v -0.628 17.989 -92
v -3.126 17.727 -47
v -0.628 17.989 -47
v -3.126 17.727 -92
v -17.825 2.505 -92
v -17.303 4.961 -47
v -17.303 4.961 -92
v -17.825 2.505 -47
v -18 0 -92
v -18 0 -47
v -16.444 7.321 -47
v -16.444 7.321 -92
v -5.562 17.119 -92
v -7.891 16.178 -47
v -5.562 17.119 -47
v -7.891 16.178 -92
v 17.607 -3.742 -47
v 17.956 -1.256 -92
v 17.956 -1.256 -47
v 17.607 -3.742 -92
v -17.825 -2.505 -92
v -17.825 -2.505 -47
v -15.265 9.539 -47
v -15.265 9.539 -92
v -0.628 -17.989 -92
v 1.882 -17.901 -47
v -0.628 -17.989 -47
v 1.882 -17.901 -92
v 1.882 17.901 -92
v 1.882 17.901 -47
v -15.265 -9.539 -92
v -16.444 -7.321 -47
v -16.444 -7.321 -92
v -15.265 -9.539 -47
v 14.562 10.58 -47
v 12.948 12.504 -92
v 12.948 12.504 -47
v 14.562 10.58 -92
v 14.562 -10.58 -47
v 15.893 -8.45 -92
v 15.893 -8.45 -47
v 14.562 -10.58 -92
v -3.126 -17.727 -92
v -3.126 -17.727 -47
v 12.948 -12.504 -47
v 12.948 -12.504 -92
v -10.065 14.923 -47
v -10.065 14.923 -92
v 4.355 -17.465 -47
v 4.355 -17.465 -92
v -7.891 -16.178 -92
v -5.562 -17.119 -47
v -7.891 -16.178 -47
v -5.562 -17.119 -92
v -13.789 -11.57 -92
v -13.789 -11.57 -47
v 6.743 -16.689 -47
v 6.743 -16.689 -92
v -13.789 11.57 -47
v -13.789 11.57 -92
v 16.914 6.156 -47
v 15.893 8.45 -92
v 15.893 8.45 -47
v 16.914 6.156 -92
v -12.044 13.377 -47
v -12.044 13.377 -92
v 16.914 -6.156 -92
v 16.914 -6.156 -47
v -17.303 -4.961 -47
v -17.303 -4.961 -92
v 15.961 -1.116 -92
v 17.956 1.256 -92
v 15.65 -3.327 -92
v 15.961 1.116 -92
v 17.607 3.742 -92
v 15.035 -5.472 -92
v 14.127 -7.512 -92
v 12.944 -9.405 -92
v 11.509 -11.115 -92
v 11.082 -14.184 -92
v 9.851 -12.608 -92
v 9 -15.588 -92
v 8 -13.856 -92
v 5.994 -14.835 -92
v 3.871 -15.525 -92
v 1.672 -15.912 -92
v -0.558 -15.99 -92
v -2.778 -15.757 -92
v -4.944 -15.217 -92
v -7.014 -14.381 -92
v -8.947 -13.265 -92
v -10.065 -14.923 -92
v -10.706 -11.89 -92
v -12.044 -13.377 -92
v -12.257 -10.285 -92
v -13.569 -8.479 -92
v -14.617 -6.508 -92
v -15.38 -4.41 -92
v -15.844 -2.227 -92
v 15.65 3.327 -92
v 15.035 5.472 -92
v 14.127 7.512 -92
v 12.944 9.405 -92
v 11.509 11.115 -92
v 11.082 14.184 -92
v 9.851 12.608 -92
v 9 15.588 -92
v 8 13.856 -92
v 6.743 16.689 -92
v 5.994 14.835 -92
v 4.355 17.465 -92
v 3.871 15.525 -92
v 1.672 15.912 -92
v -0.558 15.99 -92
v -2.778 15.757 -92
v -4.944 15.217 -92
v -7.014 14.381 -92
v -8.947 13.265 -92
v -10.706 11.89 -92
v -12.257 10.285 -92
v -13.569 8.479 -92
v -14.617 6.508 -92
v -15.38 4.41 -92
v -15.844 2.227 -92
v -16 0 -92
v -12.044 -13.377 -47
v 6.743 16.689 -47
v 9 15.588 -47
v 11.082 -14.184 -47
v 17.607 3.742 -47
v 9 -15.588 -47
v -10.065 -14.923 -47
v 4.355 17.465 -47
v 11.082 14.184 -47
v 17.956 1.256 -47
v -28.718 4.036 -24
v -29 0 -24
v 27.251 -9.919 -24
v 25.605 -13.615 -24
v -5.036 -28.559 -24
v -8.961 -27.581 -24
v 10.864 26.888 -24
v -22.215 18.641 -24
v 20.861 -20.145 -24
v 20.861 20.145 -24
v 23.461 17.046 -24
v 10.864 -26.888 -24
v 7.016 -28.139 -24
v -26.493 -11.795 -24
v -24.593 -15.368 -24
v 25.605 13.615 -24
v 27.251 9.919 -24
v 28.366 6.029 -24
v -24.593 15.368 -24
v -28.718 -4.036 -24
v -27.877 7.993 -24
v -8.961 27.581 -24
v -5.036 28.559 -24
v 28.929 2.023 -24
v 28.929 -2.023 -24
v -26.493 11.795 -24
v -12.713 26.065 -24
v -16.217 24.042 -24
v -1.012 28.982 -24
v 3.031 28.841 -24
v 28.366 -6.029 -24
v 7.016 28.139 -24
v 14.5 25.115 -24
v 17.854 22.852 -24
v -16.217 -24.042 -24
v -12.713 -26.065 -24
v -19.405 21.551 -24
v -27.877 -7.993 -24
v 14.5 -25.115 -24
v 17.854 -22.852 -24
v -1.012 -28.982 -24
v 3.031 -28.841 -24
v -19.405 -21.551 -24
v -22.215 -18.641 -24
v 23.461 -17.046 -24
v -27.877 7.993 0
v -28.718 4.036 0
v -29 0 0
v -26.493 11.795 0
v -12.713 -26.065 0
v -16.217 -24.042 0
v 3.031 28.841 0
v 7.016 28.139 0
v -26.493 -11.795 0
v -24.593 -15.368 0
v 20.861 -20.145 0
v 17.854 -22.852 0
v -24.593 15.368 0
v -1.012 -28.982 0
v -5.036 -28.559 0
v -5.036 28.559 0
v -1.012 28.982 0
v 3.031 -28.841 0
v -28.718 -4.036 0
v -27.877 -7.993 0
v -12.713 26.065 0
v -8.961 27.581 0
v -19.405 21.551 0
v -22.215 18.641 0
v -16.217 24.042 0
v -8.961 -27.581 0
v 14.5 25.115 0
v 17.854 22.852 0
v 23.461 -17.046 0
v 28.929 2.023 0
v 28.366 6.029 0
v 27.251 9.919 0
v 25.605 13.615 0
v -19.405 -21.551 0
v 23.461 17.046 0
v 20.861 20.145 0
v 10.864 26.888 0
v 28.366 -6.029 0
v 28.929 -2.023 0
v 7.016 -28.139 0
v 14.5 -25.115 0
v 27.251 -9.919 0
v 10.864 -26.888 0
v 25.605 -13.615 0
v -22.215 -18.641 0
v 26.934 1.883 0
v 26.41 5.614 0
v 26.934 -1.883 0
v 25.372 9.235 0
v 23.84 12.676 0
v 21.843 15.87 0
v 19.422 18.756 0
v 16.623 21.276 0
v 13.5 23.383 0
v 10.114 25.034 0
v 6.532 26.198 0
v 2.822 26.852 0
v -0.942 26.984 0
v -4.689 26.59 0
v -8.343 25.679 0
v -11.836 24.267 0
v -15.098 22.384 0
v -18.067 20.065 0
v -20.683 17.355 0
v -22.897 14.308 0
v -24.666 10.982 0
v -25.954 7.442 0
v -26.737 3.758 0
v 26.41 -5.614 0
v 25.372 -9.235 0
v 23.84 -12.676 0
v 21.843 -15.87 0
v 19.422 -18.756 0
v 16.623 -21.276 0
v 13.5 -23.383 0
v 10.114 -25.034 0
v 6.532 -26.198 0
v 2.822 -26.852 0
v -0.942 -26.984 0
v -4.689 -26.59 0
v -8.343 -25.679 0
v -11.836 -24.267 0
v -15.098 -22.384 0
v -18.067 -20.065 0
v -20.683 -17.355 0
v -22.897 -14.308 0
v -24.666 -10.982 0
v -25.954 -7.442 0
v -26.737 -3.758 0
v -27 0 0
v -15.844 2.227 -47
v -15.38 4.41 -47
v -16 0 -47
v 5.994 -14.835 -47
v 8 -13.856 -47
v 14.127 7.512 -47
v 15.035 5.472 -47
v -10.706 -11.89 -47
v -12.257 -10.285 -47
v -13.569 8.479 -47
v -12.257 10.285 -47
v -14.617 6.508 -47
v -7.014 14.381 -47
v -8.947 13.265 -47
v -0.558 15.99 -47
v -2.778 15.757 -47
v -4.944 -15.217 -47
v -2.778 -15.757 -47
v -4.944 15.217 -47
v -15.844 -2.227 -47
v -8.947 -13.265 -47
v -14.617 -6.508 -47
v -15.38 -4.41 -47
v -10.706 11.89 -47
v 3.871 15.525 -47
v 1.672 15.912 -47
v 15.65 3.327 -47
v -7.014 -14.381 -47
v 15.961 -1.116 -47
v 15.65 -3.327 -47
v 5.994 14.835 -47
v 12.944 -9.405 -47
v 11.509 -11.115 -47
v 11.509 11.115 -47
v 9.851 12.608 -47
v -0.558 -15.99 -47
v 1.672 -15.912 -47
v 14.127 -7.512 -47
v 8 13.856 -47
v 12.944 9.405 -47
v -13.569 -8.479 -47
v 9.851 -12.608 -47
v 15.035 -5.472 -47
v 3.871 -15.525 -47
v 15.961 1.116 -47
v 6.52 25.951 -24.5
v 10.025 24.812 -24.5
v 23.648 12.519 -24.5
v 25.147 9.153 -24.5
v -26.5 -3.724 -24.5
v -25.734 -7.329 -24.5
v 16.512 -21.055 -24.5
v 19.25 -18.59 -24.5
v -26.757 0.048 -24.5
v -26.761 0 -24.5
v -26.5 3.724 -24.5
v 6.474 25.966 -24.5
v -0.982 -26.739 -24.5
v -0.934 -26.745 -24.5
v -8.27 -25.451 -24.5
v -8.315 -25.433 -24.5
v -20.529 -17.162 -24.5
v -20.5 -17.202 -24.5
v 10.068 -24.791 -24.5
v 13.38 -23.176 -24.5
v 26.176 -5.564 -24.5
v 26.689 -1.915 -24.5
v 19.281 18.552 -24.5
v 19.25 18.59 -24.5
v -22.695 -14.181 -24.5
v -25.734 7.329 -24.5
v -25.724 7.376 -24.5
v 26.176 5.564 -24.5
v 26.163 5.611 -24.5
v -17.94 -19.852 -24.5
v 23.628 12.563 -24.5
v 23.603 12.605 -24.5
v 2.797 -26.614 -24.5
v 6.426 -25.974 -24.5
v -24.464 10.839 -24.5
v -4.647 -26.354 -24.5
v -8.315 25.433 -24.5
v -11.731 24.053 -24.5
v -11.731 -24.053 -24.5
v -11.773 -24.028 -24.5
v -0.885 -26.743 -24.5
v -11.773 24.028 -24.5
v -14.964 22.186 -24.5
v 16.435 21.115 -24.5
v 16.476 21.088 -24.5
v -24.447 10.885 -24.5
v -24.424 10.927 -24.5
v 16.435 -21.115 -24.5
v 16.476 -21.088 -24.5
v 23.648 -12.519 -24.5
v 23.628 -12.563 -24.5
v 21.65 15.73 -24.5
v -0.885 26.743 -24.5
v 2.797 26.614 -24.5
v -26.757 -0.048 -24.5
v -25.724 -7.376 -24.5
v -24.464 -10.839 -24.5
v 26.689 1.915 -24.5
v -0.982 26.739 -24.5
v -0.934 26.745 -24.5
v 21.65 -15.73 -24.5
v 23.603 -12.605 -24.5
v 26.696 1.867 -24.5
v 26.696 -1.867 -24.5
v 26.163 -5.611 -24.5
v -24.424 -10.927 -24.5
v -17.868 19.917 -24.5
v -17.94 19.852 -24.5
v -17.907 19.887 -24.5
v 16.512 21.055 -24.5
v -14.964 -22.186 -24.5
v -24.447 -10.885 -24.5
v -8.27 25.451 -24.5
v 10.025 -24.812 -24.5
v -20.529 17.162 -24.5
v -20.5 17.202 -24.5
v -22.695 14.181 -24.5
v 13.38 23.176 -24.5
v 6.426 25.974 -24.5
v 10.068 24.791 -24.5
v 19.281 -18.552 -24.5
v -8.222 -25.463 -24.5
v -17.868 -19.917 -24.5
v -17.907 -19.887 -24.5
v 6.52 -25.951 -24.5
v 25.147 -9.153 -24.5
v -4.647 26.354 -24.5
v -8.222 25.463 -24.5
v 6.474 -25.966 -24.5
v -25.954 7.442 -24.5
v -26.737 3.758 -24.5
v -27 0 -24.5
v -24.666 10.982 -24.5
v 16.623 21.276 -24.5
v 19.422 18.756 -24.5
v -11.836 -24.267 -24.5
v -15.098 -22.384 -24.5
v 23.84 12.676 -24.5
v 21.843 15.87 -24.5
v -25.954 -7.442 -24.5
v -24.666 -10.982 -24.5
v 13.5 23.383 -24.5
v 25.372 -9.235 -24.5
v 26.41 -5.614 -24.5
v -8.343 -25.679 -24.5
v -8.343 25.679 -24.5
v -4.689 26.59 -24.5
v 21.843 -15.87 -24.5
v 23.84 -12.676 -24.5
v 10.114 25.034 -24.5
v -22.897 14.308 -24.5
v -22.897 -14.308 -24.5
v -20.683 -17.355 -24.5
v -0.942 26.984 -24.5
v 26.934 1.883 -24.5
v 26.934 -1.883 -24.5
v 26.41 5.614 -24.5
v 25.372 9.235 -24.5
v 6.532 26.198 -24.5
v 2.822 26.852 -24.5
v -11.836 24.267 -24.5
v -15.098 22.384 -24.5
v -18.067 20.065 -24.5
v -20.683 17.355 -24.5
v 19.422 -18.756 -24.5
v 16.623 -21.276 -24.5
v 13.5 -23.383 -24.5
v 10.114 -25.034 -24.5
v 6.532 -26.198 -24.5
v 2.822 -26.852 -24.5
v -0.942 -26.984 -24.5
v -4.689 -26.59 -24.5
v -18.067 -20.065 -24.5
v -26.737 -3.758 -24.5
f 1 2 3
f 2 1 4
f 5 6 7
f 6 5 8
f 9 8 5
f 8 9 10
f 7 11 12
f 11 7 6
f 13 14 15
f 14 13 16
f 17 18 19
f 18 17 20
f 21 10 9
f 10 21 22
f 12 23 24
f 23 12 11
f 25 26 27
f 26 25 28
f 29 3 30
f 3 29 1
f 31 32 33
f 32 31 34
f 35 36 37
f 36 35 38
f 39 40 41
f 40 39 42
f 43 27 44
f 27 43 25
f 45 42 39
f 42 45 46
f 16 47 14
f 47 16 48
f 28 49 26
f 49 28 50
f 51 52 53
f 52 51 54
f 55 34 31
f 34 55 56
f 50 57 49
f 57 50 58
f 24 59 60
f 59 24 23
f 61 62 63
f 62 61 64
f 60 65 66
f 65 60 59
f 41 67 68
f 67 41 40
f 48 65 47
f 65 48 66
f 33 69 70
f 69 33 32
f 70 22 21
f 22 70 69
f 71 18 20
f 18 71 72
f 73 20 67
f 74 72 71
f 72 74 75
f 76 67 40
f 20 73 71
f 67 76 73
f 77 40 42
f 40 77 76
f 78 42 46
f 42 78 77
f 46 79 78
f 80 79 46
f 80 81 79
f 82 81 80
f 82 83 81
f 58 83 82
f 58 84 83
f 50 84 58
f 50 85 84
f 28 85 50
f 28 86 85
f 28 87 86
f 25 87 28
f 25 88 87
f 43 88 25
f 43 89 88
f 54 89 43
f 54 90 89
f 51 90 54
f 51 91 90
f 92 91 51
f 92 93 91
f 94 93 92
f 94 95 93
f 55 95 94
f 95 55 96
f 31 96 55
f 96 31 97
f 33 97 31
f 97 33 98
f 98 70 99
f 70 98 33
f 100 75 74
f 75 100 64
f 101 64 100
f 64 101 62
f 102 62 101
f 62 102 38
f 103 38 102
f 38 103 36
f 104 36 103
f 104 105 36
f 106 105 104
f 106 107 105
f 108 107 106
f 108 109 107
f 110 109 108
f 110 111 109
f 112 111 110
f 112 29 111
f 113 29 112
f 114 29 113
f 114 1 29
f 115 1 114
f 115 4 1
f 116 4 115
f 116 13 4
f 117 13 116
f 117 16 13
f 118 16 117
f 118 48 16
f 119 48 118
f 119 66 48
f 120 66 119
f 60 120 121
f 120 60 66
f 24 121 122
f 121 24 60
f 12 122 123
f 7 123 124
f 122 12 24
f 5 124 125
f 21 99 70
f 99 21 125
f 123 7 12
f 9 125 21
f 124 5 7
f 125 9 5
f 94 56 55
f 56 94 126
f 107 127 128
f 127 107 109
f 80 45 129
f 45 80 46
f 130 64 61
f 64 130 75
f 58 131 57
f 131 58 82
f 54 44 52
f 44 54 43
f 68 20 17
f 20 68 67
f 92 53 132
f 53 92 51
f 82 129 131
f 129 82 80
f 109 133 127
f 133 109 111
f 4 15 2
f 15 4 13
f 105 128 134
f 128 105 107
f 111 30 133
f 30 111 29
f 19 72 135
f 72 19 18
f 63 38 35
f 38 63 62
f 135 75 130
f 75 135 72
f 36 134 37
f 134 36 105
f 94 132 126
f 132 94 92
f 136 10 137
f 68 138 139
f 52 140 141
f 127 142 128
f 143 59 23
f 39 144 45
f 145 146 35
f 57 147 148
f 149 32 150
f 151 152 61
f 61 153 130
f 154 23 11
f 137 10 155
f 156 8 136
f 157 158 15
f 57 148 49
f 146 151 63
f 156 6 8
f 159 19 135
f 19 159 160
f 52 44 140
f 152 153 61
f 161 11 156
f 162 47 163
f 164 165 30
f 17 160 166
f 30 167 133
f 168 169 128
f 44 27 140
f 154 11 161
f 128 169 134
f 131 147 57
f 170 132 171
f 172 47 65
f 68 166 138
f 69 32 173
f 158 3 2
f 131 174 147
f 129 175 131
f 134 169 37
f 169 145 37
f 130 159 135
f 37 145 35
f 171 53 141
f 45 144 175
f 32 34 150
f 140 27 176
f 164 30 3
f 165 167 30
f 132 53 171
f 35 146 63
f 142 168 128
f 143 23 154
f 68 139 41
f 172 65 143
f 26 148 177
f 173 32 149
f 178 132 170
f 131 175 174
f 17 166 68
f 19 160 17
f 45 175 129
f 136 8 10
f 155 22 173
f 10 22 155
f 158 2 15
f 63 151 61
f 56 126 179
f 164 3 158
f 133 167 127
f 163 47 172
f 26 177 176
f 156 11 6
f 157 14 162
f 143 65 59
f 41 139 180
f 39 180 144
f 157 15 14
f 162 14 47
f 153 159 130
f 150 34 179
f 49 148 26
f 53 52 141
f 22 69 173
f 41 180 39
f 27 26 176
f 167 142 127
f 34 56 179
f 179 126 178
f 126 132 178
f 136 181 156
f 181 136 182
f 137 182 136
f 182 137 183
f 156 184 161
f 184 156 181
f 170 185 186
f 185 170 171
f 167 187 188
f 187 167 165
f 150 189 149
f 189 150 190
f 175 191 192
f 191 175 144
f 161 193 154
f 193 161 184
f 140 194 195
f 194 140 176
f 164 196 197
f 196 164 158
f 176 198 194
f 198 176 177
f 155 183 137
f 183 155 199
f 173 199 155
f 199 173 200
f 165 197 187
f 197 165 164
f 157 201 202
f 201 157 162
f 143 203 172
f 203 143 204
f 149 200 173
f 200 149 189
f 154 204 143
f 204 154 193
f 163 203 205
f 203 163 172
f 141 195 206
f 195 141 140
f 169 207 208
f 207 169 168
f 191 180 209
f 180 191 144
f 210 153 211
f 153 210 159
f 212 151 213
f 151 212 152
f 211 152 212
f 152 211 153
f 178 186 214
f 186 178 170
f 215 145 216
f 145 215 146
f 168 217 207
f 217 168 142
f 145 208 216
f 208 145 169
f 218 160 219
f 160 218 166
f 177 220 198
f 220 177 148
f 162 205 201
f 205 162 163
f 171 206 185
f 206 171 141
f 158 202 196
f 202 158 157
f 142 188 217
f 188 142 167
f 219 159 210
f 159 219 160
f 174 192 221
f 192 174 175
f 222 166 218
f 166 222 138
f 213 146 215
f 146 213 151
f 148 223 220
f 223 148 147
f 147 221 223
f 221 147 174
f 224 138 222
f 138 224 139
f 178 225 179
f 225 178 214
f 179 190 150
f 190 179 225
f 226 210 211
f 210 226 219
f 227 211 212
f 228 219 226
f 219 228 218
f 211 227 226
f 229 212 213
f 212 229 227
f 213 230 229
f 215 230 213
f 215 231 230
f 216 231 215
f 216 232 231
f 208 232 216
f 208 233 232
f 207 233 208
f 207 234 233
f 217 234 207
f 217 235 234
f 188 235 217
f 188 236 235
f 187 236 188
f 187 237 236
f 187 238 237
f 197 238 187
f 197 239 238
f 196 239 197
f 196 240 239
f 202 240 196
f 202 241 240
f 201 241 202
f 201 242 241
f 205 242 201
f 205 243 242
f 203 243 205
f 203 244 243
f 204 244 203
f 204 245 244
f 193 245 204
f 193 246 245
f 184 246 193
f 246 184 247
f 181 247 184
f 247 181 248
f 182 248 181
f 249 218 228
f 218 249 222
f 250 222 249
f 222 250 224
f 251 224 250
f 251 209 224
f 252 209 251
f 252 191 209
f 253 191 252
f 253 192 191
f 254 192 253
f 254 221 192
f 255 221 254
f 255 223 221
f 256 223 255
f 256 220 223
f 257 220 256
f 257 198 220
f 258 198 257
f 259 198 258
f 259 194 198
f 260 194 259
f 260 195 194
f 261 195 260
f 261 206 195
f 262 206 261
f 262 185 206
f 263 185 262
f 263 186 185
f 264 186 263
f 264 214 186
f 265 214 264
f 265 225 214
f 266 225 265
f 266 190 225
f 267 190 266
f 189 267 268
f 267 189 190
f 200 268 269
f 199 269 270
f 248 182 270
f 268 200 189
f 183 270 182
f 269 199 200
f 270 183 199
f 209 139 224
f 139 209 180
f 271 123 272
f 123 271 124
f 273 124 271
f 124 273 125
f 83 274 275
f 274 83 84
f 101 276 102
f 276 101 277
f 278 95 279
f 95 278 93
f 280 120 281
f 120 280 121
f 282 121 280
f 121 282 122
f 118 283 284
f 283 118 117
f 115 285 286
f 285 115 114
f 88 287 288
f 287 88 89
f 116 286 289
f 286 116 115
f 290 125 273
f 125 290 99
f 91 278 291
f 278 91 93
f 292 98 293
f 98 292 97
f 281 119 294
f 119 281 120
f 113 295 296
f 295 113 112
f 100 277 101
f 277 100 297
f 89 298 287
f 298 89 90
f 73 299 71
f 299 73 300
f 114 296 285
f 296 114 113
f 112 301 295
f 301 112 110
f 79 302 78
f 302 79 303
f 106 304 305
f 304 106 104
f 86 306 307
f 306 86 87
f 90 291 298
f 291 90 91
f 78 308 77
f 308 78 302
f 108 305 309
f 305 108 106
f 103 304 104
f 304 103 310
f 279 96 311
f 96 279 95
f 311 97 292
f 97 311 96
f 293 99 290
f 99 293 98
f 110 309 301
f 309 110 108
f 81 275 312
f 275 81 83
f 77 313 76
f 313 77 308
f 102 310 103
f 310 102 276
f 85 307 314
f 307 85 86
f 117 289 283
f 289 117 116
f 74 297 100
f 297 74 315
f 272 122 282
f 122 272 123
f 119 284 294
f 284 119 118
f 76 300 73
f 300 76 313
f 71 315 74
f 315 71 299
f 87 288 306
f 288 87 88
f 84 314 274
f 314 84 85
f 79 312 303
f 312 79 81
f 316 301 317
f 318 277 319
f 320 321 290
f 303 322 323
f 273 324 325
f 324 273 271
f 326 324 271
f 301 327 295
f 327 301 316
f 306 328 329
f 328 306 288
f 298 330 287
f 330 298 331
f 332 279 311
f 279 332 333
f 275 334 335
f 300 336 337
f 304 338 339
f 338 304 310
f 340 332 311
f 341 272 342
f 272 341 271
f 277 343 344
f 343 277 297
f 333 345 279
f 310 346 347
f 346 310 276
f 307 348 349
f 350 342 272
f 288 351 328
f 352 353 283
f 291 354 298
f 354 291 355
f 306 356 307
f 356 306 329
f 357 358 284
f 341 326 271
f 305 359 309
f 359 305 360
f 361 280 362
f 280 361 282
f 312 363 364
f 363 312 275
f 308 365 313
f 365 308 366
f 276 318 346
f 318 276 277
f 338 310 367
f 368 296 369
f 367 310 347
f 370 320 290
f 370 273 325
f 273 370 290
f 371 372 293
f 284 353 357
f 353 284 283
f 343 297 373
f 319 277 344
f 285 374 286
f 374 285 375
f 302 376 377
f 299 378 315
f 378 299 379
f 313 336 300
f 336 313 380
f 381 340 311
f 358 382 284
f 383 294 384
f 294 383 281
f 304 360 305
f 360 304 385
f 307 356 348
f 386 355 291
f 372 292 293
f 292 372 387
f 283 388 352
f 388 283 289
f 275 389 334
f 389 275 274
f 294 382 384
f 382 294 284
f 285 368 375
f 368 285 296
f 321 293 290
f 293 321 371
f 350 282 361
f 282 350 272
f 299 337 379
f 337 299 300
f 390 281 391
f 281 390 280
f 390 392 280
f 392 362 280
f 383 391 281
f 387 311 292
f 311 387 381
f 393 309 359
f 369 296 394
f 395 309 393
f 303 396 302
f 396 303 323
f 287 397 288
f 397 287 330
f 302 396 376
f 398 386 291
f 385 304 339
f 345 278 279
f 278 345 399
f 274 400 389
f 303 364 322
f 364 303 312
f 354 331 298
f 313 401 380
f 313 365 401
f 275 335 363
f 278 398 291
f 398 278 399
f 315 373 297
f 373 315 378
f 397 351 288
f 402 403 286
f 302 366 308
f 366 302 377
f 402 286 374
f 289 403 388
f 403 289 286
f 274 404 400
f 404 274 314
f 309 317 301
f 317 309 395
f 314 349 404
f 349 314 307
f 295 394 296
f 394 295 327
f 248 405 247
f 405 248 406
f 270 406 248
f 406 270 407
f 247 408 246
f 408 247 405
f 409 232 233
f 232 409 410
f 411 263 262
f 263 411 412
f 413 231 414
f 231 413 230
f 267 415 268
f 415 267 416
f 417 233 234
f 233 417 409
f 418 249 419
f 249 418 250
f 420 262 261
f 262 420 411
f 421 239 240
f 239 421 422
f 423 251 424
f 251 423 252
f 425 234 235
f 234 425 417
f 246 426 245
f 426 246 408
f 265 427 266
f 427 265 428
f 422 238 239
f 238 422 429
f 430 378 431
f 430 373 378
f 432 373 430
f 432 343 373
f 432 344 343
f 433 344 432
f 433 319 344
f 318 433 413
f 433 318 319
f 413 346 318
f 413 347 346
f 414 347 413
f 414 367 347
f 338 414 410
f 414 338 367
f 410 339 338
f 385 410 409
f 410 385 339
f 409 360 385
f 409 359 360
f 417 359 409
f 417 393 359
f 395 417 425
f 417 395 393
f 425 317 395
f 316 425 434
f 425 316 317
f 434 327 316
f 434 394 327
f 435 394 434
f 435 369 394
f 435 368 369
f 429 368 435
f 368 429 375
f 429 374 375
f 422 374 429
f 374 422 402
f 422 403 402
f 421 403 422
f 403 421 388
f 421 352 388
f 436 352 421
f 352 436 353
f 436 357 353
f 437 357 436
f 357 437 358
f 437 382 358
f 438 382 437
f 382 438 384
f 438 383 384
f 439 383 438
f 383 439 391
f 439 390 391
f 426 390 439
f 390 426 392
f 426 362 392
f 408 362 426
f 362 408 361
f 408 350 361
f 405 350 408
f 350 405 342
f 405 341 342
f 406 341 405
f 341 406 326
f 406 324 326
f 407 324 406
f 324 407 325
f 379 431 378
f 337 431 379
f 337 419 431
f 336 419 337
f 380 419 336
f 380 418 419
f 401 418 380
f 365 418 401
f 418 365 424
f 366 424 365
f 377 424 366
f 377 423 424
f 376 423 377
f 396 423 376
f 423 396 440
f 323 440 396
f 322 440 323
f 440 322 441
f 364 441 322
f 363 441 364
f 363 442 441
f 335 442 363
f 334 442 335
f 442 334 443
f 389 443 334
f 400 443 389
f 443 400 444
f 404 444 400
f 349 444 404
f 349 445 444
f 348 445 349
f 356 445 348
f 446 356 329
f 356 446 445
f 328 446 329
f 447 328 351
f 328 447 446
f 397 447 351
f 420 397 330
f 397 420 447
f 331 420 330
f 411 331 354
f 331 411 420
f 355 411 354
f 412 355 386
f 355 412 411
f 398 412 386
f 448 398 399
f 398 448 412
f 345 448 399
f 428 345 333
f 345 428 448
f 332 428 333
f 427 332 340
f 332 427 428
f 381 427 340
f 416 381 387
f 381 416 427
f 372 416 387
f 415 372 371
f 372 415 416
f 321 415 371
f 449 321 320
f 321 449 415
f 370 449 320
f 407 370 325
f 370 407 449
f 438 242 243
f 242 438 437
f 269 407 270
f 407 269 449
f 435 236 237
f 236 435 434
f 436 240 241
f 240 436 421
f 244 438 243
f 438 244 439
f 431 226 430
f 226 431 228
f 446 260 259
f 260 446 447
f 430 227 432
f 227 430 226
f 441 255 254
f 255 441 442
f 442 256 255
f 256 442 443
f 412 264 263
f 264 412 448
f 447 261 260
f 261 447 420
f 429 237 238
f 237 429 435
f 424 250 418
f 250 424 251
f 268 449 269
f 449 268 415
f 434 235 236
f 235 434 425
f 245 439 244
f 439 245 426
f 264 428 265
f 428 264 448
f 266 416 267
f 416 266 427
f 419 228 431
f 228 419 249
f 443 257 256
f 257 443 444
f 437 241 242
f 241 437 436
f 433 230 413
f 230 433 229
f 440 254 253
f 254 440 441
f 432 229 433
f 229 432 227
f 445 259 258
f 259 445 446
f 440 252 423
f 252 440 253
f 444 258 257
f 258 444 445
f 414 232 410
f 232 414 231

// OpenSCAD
//CUSTOMIZER VARIABLES


//How thick your walls are (in mm)
wallThickness = 2;

//The diameter inside the "small" end. Fits over the vacuum.
insideVacuum = 32;
//The length of the tube that fits over the vacuum.
vacuumLength = 45;

//The diameter of the outside of the "large" end. Fits inside something else
outsideBandsaw = 58;
//The length of the larger tube.
bandsawLength=24;

//CUSTOMIZER VARIABLES END

$fn=45;
rotate([0,180,0])
difference() {
  union() {
    translate([0,0,bandsawLength+(vacuumLength+bandsawLength)/3])
    cylinder(r=(insideVacuum/2)+wallThickness, h=vacuumLength);


    translate([0,0,bandsawLength])
    cylinder(r2=(insideVacuum/2)+wallThickness, r1=(outsideBandsaw/2),h=(vacuumLength+bandsawLength)/3);

  cylinder(r=(outsideBandsaw/2), h=bandsawLength);
 }

translate([0,0,bandsawLength+(vacuumLength+bandsawLength)/3-0.5])
#cylinder(r=(insideVacuum/2),h=vacuumLength+1);

  translate([0,0,bandsawLength])
   #cylinder(r2=(insideVacuum/2), r1=(outsideBandsaw/2)-wallThickness,h=(vacuumLength+bandsawLength)/3 );

translate([0,0,-0.5])
#cylinder(r=(outsideBandsaw/2)-wallThickness, h=bandsawLength+1);
 }
